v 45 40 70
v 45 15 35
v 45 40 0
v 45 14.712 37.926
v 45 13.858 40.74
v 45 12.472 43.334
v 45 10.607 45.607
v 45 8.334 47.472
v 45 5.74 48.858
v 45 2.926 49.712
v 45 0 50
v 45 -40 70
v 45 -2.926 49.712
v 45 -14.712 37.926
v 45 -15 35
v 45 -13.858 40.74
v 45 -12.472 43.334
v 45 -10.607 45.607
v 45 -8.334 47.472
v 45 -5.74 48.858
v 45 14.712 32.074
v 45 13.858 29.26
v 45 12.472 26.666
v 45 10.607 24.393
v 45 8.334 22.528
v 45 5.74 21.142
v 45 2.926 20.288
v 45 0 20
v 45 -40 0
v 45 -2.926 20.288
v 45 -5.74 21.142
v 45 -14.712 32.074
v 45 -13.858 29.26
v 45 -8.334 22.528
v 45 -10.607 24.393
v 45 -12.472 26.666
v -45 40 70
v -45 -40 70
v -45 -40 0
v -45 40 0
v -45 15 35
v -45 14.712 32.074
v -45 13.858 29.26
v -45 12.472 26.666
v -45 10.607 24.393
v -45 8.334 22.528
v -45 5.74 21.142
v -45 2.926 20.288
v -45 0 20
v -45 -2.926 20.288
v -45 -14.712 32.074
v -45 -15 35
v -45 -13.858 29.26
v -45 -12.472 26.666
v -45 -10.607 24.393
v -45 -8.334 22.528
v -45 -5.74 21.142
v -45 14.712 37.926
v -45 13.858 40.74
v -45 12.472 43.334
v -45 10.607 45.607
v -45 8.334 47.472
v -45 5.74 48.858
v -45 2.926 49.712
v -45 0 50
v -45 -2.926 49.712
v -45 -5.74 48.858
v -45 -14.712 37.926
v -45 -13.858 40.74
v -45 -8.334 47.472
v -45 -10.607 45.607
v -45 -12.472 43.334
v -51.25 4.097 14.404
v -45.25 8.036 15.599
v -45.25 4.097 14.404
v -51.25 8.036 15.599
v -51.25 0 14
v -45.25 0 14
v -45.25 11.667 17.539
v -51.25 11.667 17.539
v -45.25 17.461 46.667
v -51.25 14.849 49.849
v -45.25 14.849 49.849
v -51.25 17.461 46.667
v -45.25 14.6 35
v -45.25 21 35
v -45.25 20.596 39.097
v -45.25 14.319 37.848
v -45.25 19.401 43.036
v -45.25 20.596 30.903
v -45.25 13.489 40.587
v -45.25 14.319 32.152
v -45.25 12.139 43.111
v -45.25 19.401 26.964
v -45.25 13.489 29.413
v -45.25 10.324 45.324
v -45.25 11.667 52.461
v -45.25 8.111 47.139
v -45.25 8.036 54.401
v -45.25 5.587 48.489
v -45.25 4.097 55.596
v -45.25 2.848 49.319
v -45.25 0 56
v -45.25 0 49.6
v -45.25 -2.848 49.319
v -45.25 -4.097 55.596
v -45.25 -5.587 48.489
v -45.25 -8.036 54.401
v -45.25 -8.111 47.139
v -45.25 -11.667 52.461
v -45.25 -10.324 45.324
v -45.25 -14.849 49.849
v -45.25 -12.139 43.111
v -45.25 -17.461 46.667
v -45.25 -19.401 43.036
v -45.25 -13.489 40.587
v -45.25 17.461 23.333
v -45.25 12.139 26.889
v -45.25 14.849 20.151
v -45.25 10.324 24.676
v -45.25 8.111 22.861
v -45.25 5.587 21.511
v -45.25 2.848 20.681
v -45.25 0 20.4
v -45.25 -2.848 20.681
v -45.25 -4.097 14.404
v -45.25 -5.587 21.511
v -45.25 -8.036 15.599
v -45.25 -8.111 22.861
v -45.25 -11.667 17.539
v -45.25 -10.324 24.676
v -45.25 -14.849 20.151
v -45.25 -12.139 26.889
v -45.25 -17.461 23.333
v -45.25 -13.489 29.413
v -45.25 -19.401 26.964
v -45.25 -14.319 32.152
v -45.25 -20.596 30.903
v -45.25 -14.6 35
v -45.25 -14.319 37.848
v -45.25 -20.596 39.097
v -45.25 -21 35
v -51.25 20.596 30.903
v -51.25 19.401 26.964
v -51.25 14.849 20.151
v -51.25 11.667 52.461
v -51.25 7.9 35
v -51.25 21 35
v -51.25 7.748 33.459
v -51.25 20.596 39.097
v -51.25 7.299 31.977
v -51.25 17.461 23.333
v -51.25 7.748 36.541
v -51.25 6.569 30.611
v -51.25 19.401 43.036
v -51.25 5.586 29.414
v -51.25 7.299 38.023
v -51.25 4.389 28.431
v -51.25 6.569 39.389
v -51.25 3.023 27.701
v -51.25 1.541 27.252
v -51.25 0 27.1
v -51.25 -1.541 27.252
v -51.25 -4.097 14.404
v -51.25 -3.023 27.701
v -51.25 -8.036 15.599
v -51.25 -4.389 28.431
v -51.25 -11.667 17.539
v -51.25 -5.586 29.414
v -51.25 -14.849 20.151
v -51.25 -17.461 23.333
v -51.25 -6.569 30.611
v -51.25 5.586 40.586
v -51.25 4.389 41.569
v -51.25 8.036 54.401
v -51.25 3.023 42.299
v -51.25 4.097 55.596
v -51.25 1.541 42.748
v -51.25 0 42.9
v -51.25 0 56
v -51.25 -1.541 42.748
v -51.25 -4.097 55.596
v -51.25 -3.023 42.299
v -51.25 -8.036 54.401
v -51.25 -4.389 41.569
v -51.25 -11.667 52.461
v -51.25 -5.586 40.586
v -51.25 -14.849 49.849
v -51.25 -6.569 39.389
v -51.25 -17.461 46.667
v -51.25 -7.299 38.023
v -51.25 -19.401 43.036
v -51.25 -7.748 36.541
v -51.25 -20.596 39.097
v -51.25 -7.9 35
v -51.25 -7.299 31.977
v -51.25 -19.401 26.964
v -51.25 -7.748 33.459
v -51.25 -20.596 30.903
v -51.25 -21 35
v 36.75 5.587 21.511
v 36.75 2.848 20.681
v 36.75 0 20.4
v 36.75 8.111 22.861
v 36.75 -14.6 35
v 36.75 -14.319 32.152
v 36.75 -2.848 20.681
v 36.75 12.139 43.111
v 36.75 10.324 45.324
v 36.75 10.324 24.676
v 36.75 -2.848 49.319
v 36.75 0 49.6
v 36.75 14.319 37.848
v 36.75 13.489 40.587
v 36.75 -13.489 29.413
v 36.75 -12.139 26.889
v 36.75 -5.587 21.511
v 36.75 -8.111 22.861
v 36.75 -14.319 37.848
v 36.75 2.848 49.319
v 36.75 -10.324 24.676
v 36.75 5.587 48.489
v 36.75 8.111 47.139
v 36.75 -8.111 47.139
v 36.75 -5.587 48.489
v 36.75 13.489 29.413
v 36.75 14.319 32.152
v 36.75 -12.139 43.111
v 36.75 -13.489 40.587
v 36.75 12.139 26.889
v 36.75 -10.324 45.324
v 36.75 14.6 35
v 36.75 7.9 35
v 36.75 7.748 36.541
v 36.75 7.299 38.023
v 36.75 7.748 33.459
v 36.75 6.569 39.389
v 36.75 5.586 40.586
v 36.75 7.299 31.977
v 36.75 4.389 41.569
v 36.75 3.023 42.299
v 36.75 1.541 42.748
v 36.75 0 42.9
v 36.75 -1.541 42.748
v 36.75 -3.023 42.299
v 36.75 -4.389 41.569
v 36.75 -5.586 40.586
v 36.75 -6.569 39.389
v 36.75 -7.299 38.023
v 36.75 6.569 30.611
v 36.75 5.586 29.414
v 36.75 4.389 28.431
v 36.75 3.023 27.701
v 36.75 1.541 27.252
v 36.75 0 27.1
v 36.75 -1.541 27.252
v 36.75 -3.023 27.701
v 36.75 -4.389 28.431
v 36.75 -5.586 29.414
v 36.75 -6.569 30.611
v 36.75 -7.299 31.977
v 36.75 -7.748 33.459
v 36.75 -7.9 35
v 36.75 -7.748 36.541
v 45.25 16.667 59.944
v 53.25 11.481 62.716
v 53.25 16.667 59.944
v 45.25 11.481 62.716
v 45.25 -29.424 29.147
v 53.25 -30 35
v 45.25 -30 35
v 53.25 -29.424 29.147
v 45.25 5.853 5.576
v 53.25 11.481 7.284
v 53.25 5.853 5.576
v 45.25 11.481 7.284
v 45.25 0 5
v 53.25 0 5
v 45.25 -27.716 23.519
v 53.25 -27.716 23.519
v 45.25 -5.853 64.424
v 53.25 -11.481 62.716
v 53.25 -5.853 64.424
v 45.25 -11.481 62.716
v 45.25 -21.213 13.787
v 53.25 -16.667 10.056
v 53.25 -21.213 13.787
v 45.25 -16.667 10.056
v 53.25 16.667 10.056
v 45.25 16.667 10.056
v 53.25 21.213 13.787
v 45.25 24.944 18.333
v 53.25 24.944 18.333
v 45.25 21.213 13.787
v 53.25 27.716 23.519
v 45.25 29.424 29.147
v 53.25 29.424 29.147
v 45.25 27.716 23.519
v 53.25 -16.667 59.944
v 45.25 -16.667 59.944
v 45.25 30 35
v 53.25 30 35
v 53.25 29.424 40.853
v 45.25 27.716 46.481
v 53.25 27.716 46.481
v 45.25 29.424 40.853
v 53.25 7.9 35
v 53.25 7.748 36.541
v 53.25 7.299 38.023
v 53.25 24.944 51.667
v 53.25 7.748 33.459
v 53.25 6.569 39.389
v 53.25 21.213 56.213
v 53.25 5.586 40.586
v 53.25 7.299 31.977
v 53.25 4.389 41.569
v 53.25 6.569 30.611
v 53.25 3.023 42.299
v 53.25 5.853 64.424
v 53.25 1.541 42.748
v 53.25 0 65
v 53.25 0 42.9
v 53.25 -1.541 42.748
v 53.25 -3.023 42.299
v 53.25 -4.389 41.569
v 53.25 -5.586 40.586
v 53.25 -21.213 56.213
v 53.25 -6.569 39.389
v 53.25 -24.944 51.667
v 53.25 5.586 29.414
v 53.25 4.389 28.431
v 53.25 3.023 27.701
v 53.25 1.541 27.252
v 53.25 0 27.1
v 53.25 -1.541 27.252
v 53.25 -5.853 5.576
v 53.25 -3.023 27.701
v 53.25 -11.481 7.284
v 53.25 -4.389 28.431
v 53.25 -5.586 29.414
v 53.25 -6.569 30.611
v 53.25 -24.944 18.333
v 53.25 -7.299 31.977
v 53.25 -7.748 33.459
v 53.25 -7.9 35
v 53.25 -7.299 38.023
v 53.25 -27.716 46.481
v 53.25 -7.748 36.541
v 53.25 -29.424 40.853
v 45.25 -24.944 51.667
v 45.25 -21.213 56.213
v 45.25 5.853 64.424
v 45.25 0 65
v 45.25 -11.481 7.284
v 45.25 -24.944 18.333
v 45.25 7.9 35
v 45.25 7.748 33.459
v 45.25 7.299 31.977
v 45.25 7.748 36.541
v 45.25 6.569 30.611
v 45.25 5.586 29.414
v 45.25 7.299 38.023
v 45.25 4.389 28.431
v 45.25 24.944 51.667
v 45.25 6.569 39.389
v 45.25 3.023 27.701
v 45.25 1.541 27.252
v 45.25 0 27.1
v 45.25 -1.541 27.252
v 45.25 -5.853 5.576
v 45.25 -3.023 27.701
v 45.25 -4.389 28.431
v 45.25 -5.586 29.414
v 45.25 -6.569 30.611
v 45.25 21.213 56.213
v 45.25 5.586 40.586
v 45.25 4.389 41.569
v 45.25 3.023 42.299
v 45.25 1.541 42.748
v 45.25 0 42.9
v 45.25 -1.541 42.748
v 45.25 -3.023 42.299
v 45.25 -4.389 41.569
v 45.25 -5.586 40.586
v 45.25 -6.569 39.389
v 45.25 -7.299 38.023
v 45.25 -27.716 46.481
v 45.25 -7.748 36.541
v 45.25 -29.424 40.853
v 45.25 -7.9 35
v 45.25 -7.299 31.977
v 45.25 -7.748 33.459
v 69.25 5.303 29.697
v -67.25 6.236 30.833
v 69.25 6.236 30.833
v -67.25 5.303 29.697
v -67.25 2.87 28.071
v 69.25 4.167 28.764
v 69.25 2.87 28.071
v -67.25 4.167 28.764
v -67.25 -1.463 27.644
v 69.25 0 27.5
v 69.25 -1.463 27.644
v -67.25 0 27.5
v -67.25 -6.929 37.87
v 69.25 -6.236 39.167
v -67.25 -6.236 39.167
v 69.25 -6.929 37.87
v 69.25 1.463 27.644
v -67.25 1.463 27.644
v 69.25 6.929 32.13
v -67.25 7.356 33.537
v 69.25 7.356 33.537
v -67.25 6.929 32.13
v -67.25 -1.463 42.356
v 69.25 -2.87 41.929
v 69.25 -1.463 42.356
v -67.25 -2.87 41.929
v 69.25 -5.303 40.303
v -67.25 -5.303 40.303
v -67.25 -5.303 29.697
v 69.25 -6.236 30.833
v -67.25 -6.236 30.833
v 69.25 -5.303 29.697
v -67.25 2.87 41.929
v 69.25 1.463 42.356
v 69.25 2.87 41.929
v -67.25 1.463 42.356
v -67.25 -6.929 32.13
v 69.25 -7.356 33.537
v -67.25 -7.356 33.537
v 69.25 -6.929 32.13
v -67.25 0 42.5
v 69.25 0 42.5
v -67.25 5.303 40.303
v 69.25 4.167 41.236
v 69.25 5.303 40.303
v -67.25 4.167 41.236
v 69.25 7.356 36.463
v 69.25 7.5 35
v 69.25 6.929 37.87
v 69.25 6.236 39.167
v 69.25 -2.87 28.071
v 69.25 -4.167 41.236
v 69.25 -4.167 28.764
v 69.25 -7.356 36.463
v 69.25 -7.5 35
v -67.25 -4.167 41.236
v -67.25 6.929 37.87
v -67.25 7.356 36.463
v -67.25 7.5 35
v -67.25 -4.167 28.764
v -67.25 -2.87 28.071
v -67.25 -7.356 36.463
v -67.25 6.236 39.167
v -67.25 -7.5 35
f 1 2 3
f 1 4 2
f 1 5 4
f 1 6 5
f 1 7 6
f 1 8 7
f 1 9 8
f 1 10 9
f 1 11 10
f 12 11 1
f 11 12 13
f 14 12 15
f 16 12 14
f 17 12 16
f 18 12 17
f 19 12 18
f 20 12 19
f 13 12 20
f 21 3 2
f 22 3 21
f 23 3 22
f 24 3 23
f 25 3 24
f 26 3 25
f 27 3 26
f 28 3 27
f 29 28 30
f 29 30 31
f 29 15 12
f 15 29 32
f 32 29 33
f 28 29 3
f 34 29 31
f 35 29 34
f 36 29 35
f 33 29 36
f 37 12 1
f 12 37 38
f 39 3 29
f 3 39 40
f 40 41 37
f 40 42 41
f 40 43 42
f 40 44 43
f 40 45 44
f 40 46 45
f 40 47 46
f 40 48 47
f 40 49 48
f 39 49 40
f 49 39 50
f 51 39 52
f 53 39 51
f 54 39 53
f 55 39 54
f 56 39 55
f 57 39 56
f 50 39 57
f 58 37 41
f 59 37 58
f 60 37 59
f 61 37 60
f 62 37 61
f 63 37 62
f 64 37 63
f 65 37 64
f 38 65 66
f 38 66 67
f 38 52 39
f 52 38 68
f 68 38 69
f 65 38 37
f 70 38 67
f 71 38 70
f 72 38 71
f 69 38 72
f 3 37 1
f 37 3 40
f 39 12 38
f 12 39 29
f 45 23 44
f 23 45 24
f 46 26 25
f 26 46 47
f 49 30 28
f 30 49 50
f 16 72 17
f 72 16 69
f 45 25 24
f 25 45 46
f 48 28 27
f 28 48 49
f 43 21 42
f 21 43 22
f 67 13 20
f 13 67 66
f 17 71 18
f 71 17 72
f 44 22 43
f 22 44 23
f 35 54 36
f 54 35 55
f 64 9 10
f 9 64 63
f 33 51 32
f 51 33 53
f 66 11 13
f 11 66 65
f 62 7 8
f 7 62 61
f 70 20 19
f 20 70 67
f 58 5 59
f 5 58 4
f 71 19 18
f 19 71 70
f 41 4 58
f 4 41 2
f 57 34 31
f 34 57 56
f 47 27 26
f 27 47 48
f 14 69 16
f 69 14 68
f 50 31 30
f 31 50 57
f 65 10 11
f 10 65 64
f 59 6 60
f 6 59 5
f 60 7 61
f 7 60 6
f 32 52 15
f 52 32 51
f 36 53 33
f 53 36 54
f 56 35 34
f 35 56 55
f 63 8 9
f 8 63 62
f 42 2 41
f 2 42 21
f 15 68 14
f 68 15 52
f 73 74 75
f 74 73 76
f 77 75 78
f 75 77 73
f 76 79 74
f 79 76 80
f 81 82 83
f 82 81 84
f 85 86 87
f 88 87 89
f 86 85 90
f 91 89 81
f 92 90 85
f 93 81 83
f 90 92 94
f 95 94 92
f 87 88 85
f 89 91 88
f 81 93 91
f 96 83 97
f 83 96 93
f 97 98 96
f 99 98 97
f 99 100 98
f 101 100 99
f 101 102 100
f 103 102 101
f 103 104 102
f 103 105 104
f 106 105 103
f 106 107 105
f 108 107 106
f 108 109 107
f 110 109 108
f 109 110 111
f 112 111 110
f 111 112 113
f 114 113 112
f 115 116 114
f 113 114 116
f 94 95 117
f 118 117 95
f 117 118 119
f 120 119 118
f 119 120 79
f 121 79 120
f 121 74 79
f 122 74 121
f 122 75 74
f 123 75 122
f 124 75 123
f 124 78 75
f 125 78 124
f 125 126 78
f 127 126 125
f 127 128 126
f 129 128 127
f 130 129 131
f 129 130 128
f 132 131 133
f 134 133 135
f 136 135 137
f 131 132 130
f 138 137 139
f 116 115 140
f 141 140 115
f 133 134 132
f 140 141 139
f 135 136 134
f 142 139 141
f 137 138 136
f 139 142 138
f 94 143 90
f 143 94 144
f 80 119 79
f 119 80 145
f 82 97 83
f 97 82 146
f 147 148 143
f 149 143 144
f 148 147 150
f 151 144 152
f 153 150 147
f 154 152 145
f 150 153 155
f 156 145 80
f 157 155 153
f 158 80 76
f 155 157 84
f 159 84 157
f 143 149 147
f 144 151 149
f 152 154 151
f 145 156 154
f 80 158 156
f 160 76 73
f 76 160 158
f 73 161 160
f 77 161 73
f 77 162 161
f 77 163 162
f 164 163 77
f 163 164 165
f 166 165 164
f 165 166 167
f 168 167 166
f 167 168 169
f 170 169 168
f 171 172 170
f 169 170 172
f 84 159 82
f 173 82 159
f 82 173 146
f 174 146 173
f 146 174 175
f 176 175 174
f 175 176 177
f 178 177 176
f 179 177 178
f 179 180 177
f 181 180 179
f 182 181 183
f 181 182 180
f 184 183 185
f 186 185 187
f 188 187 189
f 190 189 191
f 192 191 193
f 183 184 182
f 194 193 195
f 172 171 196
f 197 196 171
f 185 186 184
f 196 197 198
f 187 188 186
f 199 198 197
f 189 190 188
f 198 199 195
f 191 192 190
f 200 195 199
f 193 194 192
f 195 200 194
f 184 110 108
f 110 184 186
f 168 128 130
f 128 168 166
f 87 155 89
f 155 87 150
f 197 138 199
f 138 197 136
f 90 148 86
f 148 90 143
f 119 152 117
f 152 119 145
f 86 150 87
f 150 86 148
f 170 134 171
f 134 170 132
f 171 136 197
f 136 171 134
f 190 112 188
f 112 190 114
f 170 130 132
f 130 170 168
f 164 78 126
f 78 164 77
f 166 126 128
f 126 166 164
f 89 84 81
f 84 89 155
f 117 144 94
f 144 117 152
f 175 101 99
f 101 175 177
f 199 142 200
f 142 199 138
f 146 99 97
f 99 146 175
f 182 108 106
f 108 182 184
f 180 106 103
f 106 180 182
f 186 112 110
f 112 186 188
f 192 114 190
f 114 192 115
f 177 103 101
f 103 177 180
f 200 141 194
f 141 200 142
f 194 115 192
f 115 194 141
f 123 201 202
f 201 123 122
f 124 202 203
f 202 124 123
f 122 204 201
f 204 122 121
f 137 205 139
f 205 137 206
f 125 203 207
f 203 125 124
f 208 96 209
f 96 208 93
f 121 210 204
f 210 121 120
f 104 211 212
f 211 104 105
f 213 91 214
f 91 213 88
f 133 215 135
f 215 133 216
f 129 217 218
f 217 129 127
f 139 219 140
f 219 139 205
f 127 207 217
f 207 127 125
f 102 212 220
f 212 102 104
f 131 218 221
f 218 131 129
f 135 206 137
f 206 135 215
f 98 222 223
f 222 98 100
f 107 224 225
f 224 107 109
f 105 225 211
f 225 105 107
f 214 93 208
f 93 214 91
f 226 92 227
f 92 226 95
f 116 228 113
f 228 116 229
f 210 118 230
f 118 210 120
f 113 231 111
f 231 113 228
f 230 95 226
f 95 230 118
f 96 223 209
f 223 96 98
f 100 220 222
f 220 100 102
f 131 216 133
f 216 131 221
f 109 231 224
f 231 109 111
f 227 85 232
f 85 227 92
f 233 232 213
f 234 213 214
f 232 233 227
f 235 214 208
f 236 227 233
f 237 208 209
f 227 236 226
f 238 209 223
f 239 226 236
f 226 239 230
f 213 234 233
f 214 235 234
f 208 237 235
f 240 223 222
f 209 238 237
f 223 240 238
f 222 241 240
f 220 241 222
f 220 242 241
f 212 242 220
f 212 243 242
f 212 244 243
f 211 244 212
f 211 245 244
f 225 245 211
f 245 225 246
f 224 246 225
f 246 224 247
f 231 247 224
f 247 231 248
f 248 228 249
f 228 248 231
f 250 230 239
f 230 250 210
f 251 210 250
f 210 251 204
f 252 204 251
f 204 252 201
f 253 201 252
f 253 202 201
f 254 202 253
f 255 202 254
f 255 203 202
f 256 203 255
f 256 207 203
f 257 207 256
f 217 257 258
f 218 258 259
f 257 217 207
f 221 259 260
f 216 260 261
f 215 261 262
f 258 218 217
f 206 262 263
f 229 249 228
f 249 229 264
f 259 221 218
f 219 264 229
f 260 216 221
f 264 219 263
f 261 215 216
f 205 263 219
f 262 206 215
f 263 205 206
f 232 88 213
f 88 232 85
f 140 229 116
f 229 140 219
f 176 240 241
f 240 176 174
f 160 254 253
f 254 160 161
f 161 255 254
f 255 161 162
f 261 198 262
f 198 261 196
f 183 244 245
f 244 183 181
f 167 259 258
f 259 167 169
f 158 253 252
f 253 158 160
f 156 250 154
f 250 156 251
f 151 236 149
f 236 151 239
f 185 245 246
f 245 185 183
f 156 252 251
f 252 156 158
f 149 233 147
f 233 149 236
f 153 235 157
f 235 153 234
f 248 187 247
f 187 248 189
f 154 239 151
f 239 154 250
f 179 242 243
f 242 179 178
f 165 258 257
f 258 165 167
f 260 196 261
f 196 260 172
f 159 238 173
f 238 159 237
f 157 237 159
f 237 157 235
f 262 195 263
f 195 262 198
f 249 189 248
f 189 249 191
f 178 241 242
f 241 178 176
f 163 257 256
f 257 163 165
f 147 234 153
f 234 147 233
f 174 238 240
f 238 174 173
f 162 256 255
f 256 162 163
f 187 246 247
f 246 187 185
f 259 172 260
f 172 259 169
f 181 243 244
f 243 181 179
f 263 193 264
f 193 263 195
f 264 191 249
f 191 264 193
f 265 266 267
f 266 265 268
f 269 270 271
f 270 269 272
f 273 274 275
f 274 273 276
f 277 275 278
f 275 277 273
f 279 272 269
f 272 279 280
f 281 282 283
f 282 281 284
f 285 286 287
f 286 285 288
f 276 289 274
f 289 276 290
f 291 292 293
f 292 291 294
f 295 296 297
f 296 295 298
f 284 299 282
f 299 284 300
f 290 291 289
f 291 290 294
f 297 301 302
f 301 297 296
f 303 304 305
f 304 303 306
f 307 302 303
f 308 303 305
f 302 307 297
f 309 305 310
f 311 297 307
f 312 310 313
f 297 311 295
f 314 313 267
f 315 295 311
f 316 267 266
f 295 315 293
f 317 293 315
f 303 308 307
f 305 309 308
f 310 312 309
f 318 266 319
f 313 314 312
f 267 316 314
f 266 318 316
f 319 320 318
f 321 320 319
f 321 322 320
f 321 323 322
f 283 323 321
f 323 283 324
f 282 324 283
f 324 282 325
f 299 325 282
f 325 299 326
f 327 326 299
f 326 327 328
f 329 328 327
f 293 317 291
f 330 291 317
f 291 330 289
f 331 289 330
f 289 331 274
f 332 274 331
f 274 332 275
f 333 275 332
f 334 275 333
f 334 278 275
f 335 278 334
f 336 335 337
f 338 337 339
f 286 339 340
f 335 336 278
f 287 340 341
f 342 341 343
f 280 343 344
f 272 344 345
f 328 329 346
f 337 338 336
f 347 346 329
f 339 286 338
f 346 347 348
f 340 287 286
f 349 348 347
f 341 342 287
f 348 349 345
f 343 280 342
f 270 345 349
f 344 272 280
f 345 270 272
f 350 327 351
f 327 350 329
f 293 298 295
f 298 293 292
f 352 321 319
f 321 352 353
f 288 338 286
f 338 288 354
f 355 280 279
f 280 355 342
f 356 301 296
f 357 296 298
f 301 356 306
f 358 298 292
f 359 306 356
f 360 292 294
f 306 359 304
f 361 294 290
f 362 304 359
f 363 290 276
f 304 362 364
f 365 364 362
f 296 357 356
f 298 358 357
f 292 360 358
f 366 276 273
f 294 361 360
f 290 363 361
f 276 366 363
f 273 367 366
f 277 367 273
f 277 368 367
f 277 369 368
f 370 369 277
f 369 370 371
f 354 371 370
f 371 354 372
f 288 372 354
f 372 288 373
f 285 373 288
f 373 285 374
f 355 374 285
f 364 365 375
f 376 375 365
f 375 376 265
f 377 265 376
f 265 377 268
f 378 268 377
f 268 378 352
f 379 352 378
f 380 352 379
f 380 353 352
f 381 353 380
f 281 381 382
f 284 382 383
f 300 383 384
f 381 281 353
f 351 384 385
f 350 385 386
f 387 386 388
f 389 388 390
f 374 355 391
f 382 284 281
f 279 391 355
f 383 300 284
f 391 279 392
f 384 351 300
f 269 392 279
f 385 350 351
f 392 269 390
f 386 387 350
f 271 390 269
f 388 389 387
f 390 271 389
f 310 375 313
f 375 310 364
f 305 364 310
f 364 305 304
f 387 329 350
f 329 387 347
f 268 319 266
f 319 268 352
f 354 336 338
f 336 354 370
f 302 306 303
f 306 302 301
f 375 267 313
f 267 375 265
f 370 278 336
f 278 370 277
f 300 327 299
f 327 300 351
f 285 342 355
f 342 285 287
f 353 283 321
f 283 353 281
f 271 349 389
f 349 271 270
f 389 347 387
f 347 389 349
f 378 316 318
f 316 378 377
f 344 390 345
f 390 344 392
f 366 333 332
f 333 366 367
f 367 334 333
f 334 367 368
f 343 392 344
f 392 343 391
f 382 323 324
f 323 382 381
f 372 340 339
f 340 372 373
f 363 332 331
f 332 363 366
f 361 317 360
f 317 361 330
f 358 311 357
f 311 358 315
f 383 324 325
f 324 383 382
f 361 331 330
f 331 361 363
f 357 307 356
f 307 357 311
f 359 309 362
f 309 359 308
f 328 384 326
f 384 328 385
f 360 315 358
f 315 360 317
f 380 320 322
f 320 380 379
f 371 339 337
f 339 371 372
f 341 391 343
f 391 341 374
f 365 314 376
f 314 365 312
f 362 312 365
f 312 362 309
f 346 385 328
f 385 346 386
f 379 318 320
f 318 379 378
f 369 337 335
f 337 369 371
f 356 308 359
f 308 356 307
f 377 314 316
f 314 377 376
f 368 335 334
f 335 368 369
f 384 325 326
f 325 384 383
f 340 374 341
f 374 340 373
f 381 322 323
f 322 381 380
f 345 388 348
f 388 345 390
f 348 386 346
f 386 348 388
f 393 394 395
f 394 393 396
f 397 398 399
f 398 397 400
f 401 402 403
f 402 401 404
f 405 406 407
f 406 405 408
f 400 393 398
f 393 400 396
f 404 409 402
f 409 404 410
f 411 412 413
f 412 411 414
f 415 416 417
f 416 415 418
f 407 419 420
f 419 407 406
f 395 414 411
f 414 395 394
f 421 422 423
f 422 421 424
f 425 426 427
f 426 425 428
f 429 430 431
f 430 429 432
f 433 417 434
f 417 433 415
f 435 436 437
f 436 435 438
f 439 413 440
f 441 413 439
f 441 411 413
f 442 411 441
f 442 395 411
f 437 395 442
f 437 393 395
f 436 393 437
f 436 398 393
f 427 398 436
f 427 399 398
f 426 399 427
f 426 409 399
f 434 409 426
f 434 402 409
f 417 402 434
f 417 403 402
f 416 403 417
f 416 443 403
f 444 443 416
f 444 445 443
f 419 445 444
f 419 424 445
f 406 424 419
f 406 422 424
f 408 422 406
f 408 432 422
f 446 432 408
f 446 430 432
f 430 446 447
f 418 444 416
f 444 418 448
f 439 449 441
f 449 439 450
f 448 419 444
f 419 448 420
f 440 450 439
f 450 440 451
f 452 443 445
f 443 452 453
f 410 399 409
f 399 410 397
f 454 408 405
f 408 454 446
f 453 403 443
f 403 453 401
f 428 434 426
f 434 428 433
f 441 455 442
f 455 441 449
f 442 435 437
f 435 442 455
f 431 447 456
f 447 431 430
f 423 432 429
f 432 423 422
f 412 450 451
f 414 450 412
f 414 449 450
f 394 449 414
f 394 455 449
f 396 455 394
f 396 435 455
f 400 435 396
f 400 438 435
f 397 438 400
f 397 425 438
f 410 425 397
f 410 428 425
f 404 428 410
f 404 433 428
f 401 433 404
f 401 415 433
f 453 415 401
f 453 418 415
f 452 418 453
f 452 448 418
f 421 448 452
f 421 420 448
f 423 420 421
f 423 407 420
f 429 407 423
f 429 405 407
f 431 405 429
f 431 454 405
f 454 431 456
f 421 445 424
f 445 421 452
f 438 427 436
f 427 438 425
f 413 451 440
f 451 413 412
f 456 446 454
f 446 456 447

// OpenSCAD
$fn = 32;

// ------------------------------------------------------------------------
// Bushed housing: 90 x 80 x 70 mm housing, bushing d29.2
// Every part is its own module, assembly() places them once.
// ------------------------------------------------------------------------

// --- part 1 ---
module housing() {
  difference() {
    translate([-45, -40, 0]) cube([90, 80, 70]);
    translate([0, 0, 35]) rotate([0, 90, 0]) cylinder(h = 92, d = 30, center = true);
  }
}

// --- part 2 ---
module bushing() {
  difference() {
    union() {
      cylinder(h = 6, d = 42);
      translate([0, 0, 6]) cylinder(h = 82, d = 29.2);
    }
    translate([0, 0, -1]) cylinder(h = 90, d = 15.8);
  }
}

// --- part 3 ---
module shaft() {
  translate([0, 0, -68.25]) cylinder(h = 136.5, d = 15);
}

// --- part 4 ---
module cover() {
  difference() {
    cylinder(h = 8, d = 60);
    translate([0, 0, -1]) cylinder(h = 10, d = 15.8);
  }
}

// --- assembly ---
module assembly() {
  translate([0, 0, 0]) rotate([0, 0, 0]) housing();
  translate([-51.25, 0, 35]) rotate([0, 90, 0]) bushing();
  translate([1, 0, 35]) rotate([0, 90, 0]) shaft();
  translate([45.25, 0, 35]) rotate([0, 90, 0]) cover();
}

assembly();
